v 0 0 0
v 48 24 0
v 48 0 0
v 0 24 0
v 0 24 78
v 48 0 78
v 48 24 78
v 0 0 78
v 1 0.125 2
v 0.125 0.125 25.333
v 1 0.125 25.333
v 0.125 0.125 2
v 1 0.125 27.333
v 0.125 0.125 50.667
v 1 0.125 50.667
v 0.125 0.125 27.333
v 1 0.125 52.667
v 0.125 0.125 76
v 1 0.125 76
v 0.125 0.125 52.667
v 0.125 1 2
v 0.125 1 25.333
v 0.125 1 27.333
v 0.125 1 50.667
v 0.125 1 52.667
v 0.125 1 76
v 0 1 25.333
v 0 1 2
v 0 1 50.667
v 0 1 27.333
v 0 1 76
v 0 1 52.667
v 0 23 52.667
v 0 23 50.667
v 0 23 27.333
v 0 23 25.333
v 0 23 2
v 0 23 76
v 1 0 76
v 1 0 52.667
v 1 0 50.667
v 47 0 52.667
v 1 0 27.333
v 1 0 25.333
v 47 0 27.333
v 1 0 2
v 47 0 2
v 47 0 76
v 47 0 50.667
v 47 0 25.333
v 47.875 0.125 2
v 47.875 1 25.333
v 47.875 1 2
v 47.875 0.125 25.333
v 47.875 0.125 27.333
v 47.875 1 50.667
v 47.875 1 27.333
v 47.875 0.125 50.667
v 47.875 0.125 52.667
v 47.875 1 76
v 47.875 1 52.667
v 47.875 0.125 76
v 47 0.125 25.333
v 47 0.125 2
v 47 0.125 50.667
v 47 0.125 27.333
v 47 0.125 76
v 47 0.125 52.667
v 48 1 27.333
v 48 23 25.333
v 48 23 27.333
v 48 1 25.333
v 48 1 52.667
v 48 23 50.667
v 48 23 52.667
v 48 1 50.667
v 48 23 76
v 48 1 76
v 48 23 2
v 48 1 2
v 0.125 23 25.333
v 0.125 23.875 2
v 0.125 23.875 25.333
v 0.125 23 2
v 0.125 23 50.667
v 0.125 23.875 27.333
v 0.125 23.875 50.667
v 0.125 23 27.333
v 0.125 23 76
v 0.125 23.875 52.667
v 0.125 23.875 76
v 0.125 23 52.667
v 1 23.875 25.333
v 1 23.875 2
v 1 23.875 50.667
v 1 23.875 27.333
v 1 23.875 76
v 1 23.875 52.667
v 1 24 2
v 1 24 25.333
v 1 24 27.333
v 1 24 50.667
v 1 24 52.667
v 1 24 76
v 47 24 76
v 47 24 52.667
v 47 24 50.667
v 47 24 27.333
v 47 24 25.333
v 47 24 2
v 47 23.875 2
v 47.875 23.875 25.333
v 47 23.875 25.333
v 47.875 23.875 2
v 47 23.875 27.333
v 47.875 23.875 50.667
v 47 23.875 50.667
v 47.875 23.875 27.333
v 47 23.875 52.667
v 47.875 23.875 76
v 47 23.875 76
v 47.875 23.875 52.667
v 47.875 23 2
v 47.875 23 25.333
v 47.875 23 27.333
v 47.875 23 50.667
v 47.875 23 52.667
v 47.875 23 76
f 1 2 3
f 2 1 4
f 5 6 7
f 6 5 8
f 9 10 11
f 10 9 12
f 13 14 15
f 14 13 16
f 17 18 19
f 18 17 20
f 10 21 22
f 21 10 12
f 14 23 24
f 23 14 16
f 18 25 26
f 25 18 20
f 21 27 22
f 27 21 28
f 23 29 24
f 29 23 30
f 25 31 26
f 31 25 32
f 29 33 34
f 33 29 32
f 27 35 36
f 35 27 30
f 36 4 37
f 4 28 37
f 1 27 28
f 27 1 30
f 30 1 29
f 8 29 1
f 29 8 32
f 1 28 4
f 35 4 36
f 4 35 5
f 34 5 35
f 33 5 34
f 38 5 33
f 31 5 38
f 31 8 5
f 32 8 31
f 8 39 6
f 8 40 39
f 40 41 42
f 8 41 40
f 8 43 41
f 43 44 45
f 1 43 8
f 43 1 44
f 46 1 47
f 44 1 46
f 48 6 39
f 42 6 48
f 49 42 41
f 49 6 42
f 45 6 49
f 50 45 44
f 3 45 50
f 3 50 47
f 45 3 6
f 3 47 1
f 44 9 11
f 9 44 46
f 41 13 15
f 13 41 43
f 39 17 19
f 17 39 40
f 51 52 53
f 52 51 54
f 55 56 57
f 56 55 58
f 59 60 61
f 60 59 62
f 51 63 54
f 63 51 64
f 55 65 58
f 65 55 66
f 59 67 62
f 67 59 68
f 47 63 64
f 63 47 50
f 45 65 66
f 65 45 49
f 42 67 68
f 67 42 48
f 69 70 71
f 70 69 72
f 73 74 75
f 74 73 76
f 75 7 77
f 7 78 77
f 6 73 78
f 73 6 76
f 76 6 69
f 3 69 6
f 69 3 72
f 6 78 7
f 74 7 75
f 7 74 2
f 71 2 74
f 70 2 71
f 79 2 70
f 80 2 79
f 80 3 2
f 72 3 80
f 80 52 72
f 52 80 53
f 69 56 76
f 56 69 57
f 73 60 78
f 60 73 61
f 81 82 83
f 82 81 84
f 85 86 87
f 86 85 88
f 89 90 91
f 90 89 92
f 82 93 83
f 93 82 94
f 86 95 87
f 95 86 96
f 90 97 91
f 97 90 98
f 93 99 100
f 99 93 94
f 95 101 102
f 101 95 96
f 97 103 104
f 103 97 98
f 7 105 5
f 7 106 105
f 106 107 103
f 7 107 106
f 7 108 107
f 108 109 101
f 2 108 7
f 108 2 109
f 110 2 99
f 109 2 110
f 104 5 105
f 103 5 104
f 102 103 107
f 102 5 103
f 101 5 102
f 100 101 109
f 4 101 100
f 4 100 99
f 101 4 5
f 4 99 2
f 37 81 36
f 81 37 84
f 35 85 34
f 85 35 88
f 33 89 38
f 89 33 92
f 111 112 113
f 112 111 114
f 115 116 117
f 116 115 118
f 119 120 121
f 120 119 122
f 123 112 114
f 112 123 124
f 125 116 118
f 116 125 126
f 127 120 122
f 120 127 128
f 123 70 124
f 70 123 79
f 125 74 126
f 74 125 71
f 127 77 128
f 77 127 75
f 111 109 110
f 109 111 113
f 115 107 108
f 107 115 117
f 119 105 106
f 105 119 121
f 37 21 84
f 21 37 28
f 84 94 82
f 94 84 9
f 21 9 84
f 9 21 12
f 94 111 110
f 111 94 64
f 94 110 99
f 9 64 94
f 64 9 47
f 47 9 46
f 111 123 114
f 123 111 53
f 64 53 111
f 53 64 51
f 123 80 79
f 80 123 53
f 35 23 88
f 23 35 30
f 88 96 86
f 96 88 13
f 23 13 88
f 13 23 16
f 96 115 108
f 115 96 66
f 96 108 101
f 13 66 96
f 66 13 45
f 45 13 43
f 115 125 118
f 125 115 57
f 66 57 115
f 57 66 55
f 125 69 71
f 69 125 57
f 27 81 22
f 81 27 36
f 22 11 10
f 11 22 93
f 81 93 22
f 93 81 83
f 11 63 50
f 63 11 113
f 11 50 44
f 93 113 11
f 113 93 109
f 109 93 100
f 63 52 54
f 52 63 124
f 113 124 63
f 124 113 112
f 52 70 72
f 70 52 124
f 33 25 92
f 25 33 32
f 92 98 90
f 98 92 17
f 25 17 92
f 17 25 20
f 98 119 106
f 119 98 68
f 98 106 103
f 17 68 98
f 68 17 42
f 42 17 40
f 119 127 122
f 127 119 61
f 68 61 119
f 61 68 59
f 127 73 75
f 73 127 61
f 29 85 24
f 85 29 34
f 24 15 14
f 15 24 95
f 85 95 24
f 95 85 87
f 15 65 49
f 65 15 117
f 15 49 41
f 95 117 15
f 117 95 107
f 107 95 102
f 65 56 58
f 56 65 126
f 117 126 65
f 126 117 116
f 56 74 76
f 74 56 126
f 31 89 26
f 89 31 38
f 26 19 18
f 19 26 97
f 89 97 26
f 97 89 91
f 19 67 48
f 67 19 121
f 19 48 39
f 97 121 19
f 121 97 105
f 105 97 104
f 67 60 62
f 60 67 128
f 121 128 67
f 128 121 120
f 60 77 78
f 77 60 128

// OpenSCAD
module shelving_leg(height) {
    linear_extrude(height)
    polygon([
        [0, 0],
        [1, 0],
        [1, 0.125],
        [0.125, 0.125],
        [0.125, 1],
        [0, 1],
    ]);
}

module shelving_legs(width, depth, height) {
    union() {
        translate([0, 0, 0])
        rotate([0, 0, 0])
        shelving_leg(height);

        translate([width, 0, 0])
        rotate([0, 0, 90])
        shelving_leg(height);

        translate([0, depth, 0])
        rotate([0, 0, -90])
        shelving_leg(height);

        translate([width, depth, 0])
        rotate([0, 0, 180])
        shelving_leg(height);
    }
}

module shelving_shelves(width, depth, height, shelves) {
    for (i = [0:((height-2)/(shelves - 1)):height-2]) {
        translate([0, 0, i])
        cube([width, depth, 2]);
    }
}

module shelving(width, depth, height, shelves=4) {
    shelving_legs(width, depth, height);
    shelving_shelves(width, depth, height, shelves);
}

shelving(48, 24, 78);
